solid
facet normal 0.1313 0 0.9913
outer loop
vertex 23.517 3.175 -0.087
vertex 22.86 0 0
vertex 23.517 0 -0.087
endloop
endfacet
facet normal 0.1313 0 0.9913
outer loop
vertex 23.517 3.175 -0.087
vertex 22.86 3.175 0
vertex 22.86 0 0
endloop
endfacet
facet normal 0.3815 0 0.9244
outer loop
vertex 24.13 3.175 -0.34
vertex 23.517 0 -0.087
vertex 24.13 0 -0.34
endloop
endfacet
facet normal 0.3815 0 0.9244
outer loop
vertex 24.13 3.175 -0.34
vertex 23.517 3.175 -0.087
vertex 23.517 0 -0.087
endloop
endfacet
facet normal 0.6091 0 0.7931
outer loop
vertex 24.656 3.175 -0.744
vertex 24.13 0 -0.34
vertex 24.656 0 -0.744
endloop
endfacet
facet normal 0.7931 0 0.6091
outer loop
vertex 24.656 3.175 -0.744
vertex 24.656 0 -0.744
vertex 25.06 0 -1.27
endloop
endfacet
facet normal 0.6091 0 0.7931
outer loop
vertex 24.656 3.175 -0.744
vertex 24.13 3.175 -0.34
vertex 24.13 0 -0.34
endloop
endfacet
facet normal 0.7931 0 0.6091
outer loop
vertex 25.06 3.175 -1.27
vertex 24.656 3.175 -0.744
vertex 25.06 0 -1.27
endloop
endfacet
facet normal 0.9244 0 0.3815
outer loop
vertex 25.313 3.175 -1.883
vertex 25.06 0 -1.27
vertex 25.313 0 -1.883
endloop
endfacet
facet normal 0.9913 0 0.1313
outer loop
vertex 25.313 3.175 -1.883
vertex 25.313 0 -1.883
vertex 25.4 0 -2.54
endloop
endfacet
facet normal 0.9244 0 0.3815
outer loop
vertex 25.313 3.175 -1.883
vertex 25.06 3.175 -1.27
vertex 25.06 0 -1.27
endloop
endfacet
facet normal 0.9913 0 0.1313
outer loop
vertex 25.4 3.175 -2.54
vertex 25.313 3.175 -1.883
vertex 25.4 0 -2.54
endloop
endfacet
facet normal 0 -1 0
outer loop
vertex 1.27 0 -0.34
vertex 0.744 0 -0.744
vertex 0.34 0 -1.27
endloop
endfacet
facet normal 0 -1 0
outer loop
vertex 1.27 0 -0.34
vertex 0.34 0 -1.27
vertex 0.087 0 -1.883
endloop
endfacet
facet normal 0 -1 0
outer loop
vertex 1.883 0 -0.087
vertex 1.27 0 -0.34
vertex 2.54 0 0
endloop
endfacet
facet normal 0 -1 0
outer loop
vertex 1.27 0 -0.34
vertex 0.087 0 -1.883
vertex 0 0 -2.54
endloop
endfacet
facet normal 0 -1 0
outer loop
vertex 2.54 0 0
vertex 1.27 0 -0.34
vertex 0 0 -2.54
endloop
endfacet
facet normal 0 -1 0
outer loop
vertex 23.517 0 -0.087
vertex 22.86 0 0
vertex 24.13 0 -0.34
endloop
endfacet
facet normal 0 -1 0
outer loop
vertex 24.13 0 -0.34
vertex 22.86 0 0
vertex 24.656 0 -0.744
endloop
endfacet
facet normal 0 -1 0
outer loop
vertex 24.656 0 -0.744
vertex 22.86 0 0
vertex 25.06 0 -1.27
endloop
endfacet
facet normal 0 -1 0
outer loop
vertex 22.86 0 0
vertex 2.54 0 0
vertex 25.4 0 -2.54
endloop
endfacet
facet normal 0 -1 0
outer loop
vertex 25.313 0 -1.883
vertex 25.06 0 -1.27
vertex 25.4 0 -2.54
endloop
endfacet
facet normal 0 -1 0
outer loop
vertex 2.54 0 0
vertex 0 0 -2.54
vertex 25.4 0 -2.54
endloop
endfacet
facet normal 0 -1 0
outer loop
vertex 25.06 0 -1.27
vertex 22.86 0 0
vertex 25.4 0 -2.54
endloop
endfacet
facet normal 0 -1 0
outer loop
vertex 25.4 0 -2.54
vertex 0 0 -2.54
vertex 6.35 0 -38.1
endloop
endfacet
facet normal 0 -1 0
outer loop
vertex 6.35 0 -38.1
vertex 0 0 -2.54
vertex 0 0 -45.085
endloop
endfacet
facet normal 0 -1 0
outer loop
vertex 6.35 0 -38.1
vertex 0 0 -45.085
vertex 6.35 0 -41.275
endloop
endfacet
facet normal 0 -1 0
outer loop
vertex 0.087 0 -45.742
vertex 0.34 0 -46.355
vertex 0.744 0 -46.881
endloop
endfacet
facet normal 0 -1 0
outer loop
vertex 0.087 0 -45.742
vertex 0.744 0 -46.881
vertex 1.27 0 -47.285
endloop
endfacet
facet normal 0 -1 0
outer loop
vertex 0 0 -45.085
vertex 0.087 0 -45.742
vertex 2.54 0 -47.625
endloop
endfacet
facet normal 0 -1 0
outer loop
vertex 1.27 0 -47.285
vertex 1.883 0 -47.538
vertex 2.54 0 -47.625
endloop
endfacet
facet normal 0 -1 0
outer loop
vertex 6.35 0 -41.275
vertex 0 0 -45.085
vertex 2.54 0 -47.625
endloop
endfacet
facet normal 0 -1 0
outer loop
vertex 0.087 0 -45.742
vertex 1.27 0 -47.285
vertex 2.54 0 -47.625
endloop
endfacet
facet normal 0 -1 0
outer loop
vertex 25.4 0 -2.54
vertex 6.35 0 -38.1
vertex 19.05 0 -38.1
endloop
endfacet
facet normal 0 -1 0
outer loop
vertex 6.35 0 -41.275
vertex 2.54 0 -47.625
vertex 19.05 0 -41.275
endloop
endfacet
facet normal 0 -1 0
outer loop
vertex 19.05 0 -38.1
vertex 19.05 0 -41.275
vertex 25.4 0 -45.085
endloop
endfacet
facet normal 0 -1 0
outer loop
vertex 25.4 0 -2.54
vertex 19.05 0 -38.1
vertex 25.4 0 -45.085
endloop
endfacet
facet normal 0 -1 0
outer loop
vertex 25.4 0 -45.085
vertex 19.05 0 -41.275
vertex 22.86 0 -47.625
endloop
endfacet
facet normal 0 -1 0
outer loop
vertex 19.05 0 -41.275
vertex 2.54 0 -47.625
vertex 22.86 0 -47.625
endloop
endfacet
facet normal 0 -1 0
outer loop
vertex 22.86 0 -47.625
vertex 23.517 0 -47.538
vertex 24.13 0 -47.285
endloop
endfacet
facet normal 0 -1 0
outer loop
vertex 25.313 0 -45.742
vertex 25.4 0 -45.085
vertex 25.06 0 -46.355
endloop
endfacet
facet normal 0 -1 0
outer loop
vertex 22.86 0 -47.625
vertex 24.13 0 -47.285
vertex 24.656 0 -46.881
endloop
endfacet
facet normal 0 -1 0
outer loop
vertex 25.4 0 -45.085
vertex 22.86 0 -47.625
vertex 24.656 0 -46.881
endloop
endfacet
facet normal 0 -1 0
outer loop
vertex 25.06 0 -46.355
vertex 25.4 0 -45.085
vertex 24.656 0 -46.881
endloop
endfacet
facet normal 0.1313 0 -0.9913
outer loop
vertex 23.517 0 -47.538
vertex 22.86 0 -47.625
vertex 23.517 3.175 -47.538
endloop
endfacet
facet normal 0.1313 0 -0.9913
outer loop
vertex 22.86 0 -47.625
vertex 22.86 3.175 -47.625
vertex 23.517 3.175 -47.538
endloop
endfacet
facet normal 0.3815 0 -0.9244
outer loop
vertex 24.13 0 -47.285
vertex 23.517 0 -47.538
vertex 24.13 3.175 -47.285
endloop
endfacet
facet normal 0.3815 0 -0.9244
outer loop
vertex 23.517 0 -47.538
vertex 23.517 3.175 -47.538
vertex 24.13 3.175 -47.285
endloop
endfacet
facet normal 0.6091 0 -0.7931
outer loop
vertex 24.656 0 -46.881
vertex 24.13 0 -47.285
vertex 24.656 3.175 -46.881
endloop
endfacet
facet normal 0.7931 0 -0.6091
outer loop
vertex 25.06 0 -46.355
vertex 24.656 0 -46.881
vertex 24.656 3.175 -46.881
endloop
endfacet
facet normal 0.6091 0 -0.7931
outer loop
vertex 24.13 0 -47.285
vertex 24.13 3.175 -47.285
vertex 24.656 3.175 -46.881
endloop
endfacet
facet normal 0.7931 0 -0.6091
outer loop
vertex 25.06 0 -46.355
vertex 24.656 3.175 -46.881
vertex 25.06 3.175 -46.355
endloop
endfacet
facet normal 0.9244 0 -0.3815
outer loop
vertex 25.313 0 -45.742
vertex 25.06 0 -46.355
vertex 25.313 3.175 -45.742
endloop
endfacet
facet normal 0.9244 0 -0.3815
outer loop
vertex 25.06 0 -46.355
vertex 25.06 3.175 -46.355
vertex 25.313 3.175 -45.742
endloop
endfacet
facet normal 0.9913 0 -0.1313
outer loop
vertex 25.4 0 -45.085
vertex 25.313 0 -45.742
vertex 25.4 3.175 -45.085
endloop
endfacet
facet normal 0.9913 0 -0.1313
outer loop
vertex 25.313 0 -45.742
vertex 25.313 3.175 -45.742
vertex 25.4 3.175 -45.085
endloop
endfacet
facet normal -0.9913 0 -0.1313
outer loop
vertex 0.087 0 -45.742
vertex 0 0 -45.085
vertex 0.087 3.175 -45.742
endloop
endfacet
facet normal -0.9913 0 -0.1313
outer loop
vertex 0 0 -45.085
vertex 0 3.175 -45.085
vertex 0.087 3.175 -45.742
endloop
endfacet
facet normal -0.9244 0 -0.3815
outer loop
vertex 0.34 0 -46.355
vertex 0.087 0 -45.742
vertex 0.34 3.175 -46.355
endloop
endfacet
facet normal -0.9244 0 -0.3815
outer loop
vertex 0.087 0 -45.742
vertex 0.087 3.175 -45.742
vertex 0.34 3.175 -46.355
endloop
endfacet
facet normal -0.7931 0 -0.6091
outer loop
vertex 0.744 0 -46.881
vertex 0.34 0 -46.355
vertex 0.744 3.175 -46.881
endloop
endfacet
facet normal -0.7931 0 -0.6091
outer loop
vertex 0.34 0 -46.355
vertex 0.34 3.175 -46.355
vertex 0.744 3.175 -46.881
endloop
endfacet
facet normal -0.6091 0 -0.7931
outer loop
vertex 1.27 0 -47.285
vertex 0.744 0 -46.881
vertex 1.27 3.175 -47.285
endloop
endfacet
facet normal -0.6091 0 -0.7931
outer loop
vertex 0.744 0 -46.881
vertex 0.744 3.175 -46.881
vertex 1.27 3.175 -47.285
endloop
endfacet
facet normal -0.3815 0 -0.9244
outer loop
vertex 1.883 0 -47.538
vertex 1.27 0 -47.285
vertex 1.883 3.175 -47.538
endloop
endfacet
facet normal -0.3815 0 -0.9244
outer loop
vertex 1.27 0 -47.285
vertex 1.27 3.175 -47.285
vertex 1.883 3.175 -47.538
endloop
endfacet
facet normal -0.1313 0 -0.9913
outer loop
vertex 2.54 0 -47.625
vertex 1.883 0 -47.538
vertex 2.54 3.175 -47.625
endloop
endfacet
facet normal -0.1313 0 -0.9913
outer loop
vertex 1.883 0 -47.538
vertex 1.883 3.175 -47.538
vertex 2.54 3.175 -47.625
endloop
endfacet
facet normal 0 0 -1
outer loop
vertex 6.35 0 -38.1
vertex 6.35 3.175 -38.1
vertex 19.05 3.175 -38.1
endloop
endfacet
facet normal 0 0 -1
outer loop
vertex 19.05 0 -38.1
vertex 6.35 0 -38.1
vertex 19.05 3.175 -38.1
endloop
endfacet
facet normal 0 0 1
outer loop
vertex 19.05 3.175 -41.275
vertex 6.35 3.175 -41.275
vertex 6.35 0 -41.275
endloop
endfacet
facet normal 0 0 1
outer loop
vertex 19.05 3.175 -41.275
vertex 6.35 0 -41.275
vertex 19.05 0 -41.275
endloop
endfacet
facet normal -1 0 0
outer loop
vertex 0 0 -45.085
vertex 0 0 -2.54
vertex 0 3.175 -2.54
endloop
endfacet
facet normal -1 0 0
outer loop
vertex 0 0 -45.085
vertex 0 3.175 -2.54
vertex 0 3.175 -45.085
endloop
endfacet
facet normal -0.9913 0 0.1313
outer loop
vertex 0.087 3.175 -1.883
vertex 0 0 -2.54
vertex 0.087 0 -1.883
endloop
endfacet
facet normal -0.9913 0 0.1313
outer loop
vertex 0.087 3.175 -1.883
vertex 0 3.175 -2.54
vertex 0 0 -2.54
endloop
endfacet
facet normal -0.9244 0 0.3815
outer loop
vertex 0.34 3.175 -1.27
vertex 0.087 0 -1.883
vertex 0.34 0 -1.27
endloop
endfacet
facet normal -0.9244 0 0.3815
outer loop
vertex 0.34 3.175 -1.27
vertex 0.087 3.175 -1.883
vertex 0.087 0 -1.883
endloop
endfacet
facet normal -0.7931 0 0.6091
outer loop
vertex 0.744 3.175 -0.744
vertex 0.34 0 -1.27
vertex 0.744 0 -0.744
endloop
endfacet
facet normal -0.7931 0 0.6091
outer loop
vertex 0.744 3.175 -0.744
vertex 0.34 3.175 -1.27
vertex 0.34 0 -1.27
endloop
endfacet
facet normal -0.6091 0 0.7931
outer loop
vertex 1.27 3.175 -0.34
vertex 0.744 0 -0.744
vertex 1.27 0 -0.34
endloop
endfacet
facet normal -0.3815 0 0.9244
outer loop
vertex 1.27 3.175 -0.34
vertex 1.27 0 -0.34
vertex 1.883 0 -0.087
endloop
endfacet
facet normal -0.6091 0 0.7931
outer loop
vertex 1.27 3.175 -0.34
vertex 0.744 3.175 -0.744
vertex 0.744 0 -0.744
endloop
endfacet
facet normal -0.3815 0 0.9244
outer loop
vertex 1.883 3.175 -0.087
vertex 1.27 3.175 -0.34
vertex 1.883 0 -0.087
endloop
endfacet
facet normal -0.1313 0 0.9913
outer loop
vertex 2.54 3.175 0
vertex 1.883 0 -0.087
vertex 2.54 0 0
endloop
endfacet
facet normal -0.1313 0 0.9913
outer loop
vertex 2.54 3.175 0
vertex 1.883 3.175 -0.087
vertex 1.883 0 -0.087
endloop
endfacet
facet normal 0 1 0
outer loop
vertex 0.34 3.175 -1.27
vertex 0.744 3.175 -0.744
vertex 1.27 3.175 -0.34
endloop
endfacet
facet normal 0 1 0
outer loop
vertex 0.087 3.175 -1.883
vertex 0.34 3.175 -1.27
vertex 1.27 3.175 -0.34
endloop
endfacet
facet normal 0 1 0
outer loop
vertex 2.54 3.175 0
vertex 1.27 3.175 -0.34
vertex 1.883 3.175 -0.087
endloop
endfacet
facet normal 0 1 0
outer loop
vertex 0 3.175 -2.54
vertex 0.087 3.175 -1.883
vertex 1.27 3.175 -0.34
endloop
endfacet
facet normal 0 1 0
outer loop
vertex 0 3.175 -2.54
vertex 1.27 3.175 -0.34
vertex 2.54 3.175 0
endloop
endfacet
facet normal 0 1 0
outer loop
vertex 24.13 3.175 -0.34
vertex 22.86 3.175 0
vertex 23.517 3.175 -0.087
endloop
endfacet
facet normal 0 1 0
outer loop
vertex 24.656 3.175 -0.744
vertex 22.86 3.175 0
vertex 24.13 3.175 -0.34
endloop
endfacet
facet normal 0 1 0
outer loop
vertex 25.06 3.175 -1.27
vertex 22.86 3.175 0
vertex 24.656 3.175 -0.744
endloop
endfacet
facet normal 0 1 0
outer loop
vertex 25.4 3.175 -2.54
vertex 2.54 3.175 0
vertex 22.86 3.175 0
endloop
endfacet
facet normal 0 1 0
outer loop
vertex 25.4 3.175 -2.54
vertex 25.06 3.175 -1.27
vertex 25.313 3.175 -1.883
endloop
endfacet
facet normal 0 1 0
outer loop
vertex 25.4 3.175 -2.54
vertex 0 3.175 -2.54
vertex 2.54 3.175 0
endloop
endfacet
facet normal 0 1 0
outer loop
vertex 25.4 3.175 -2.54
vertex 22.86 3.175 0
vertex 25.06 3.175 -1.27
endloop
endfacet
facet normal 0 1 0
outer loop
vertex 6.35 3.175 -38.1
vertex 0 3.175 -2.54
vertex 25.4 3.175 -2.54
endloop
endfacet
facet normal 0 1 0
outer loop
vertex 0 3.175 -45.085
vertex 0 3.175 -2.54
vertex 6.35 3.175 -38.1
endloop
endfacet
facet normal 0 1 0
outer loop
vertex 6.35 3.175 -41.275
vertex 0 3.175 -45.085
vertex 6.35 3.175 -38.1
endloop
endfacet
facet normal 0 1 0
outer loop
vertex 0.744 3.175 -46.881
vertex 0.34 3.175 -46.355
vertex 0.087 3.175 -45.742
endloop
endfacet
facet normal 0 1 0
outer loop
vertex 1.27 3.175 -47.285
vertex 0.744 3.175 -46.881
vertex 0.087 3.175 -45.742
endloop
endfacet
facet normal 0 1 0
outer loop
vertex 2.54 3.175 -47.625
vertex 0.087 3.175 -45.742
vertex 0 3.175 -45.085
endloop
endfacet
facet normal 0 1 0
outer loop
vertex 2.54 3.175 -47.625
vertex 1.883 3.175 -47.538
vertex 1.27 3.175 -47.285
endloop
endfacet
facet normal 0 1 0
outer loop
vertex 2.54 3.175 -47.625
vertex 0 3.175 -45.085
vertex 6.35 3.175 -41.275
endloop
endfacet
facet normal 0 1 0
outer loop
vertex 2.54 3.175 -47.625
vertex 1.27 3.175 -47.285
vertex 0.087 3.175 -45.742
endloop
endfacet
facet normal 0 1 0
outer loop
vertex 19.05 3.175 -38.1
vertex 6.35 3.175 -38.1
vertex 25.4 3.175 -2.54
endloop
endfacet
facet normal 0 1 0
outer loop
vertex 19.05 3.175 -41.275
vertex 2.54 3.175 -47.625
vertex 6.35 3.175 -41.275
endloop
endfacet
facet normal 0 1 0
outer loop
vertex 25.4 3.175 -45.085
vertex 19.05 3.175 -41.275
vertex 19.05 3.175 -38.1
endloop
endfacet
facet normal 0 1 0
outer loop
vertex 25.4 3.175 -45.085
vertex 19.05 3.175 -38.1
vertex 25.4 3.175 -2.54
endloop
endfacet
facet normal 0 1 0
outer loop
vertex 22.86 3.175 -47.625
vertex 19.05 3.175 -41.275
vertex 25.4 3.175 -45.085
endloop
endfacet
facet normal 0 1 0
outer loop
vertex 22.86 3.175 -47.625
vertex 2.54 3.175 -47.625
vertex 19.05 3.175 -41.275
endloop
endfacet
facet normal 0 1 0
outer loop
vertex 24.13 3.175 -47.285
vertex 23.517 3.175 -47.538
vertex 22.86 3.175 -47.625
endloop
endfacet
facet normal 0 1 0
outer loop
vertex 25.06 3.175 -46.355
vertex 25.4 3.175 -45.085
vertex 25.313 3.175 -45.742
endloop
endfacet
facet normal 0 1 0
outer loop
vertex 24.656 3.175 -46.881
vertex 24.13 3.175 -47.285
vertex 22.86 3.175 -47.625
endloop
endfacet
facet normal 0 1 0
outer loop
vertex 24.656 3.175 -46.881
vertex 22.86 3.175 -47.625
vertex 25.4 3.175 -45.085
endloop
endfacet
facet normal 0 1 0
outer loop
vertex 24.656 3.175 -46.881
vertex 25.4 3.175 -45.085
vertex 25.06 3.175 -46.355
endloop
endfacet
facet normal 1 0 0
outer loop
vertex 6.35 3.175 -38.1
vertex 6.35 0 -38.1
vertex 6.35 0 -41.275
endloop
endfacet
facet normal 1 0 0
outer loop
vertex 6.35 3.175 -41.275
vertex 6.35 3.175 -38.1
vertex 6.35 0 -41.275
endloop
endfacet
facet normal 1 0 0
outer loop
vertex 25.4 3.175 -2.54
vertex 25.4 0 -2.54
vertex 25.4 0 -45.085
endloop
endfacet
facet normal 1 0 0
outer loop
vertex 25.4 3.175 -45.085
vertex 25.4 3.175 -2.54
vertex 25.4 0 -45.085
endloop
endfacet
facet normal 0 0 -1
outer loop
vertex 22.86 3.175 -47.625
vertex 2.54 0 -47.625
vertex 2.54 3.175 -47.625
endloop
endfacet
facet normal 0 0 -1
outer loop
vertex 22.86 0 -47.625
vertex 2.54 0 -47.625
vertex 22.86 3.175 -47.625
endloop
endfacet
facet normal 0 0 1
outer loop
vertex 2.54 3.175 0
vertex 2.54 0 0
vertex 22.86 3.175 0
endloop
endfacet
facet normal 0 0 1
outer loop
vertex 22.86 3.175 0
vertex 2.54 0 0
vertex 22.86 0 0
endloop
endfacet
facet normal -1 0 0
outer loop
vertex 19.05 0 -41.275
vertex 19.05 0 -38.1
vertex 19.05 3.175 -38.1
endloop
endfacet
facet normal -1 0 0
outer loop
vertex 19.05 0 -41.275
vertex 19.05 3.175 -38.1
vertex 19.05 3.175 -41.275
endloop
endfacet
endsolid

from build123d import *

# Parameters (mm, degrees)
SKETCH1_W           = 25.4
SKETCH1_H           = 47.625
BOSS_EXTRUDE1_DEPTH = 3.175
SKETCH2_W           = 12.7
SKETCH2_H           = 3.175
CUT_EXTRUDE1_DEPTH  = 55.068301712
FILLET1_R           = 2.54


with BuildPart() as part:
    # Sketch1 → Boss-Extrude1 (new body)
    with BuildSketch(Plane(origin=(0, 0, 0), x_dir=(1, 0, 0), z_dir=(0, 1, 0))):
        with Locations((12.7, 23.8125)):
            Rectangle(SKETCH1_W, SKETCH1_H)
    extrude(amount=BOSS_EXTRUDE1_DEPTH)

    # Sketch2 → Cut-Extrude1 (cut, through all)
    with BuildSketch(Plane(origin=(0, 3.175, 0), x_dir=(1, 0, 0), z_dir=(0, 1, 0))):
        with Locations((12.7, 39.6875)):
            Rectangle(SKETCH2_W, SKETCH2_H)
    extrude(amount=-CUT_EXTRUDE1_DEPTH, mode=Mode.SUBTRACT)

    # Fillet1
    fillet1_edges = [part.edges().sort_by_distance(p)[0] for p in [
        (0, 1.5875, -47.625),
        (25.4, 1.5875, -47.625),
        (25.4, 1.5875, 0),
        (0, 1.5875, 0),
    ]]
    fillet(fillet1_edges, radius=FILLET1_R)


solid = part.part
